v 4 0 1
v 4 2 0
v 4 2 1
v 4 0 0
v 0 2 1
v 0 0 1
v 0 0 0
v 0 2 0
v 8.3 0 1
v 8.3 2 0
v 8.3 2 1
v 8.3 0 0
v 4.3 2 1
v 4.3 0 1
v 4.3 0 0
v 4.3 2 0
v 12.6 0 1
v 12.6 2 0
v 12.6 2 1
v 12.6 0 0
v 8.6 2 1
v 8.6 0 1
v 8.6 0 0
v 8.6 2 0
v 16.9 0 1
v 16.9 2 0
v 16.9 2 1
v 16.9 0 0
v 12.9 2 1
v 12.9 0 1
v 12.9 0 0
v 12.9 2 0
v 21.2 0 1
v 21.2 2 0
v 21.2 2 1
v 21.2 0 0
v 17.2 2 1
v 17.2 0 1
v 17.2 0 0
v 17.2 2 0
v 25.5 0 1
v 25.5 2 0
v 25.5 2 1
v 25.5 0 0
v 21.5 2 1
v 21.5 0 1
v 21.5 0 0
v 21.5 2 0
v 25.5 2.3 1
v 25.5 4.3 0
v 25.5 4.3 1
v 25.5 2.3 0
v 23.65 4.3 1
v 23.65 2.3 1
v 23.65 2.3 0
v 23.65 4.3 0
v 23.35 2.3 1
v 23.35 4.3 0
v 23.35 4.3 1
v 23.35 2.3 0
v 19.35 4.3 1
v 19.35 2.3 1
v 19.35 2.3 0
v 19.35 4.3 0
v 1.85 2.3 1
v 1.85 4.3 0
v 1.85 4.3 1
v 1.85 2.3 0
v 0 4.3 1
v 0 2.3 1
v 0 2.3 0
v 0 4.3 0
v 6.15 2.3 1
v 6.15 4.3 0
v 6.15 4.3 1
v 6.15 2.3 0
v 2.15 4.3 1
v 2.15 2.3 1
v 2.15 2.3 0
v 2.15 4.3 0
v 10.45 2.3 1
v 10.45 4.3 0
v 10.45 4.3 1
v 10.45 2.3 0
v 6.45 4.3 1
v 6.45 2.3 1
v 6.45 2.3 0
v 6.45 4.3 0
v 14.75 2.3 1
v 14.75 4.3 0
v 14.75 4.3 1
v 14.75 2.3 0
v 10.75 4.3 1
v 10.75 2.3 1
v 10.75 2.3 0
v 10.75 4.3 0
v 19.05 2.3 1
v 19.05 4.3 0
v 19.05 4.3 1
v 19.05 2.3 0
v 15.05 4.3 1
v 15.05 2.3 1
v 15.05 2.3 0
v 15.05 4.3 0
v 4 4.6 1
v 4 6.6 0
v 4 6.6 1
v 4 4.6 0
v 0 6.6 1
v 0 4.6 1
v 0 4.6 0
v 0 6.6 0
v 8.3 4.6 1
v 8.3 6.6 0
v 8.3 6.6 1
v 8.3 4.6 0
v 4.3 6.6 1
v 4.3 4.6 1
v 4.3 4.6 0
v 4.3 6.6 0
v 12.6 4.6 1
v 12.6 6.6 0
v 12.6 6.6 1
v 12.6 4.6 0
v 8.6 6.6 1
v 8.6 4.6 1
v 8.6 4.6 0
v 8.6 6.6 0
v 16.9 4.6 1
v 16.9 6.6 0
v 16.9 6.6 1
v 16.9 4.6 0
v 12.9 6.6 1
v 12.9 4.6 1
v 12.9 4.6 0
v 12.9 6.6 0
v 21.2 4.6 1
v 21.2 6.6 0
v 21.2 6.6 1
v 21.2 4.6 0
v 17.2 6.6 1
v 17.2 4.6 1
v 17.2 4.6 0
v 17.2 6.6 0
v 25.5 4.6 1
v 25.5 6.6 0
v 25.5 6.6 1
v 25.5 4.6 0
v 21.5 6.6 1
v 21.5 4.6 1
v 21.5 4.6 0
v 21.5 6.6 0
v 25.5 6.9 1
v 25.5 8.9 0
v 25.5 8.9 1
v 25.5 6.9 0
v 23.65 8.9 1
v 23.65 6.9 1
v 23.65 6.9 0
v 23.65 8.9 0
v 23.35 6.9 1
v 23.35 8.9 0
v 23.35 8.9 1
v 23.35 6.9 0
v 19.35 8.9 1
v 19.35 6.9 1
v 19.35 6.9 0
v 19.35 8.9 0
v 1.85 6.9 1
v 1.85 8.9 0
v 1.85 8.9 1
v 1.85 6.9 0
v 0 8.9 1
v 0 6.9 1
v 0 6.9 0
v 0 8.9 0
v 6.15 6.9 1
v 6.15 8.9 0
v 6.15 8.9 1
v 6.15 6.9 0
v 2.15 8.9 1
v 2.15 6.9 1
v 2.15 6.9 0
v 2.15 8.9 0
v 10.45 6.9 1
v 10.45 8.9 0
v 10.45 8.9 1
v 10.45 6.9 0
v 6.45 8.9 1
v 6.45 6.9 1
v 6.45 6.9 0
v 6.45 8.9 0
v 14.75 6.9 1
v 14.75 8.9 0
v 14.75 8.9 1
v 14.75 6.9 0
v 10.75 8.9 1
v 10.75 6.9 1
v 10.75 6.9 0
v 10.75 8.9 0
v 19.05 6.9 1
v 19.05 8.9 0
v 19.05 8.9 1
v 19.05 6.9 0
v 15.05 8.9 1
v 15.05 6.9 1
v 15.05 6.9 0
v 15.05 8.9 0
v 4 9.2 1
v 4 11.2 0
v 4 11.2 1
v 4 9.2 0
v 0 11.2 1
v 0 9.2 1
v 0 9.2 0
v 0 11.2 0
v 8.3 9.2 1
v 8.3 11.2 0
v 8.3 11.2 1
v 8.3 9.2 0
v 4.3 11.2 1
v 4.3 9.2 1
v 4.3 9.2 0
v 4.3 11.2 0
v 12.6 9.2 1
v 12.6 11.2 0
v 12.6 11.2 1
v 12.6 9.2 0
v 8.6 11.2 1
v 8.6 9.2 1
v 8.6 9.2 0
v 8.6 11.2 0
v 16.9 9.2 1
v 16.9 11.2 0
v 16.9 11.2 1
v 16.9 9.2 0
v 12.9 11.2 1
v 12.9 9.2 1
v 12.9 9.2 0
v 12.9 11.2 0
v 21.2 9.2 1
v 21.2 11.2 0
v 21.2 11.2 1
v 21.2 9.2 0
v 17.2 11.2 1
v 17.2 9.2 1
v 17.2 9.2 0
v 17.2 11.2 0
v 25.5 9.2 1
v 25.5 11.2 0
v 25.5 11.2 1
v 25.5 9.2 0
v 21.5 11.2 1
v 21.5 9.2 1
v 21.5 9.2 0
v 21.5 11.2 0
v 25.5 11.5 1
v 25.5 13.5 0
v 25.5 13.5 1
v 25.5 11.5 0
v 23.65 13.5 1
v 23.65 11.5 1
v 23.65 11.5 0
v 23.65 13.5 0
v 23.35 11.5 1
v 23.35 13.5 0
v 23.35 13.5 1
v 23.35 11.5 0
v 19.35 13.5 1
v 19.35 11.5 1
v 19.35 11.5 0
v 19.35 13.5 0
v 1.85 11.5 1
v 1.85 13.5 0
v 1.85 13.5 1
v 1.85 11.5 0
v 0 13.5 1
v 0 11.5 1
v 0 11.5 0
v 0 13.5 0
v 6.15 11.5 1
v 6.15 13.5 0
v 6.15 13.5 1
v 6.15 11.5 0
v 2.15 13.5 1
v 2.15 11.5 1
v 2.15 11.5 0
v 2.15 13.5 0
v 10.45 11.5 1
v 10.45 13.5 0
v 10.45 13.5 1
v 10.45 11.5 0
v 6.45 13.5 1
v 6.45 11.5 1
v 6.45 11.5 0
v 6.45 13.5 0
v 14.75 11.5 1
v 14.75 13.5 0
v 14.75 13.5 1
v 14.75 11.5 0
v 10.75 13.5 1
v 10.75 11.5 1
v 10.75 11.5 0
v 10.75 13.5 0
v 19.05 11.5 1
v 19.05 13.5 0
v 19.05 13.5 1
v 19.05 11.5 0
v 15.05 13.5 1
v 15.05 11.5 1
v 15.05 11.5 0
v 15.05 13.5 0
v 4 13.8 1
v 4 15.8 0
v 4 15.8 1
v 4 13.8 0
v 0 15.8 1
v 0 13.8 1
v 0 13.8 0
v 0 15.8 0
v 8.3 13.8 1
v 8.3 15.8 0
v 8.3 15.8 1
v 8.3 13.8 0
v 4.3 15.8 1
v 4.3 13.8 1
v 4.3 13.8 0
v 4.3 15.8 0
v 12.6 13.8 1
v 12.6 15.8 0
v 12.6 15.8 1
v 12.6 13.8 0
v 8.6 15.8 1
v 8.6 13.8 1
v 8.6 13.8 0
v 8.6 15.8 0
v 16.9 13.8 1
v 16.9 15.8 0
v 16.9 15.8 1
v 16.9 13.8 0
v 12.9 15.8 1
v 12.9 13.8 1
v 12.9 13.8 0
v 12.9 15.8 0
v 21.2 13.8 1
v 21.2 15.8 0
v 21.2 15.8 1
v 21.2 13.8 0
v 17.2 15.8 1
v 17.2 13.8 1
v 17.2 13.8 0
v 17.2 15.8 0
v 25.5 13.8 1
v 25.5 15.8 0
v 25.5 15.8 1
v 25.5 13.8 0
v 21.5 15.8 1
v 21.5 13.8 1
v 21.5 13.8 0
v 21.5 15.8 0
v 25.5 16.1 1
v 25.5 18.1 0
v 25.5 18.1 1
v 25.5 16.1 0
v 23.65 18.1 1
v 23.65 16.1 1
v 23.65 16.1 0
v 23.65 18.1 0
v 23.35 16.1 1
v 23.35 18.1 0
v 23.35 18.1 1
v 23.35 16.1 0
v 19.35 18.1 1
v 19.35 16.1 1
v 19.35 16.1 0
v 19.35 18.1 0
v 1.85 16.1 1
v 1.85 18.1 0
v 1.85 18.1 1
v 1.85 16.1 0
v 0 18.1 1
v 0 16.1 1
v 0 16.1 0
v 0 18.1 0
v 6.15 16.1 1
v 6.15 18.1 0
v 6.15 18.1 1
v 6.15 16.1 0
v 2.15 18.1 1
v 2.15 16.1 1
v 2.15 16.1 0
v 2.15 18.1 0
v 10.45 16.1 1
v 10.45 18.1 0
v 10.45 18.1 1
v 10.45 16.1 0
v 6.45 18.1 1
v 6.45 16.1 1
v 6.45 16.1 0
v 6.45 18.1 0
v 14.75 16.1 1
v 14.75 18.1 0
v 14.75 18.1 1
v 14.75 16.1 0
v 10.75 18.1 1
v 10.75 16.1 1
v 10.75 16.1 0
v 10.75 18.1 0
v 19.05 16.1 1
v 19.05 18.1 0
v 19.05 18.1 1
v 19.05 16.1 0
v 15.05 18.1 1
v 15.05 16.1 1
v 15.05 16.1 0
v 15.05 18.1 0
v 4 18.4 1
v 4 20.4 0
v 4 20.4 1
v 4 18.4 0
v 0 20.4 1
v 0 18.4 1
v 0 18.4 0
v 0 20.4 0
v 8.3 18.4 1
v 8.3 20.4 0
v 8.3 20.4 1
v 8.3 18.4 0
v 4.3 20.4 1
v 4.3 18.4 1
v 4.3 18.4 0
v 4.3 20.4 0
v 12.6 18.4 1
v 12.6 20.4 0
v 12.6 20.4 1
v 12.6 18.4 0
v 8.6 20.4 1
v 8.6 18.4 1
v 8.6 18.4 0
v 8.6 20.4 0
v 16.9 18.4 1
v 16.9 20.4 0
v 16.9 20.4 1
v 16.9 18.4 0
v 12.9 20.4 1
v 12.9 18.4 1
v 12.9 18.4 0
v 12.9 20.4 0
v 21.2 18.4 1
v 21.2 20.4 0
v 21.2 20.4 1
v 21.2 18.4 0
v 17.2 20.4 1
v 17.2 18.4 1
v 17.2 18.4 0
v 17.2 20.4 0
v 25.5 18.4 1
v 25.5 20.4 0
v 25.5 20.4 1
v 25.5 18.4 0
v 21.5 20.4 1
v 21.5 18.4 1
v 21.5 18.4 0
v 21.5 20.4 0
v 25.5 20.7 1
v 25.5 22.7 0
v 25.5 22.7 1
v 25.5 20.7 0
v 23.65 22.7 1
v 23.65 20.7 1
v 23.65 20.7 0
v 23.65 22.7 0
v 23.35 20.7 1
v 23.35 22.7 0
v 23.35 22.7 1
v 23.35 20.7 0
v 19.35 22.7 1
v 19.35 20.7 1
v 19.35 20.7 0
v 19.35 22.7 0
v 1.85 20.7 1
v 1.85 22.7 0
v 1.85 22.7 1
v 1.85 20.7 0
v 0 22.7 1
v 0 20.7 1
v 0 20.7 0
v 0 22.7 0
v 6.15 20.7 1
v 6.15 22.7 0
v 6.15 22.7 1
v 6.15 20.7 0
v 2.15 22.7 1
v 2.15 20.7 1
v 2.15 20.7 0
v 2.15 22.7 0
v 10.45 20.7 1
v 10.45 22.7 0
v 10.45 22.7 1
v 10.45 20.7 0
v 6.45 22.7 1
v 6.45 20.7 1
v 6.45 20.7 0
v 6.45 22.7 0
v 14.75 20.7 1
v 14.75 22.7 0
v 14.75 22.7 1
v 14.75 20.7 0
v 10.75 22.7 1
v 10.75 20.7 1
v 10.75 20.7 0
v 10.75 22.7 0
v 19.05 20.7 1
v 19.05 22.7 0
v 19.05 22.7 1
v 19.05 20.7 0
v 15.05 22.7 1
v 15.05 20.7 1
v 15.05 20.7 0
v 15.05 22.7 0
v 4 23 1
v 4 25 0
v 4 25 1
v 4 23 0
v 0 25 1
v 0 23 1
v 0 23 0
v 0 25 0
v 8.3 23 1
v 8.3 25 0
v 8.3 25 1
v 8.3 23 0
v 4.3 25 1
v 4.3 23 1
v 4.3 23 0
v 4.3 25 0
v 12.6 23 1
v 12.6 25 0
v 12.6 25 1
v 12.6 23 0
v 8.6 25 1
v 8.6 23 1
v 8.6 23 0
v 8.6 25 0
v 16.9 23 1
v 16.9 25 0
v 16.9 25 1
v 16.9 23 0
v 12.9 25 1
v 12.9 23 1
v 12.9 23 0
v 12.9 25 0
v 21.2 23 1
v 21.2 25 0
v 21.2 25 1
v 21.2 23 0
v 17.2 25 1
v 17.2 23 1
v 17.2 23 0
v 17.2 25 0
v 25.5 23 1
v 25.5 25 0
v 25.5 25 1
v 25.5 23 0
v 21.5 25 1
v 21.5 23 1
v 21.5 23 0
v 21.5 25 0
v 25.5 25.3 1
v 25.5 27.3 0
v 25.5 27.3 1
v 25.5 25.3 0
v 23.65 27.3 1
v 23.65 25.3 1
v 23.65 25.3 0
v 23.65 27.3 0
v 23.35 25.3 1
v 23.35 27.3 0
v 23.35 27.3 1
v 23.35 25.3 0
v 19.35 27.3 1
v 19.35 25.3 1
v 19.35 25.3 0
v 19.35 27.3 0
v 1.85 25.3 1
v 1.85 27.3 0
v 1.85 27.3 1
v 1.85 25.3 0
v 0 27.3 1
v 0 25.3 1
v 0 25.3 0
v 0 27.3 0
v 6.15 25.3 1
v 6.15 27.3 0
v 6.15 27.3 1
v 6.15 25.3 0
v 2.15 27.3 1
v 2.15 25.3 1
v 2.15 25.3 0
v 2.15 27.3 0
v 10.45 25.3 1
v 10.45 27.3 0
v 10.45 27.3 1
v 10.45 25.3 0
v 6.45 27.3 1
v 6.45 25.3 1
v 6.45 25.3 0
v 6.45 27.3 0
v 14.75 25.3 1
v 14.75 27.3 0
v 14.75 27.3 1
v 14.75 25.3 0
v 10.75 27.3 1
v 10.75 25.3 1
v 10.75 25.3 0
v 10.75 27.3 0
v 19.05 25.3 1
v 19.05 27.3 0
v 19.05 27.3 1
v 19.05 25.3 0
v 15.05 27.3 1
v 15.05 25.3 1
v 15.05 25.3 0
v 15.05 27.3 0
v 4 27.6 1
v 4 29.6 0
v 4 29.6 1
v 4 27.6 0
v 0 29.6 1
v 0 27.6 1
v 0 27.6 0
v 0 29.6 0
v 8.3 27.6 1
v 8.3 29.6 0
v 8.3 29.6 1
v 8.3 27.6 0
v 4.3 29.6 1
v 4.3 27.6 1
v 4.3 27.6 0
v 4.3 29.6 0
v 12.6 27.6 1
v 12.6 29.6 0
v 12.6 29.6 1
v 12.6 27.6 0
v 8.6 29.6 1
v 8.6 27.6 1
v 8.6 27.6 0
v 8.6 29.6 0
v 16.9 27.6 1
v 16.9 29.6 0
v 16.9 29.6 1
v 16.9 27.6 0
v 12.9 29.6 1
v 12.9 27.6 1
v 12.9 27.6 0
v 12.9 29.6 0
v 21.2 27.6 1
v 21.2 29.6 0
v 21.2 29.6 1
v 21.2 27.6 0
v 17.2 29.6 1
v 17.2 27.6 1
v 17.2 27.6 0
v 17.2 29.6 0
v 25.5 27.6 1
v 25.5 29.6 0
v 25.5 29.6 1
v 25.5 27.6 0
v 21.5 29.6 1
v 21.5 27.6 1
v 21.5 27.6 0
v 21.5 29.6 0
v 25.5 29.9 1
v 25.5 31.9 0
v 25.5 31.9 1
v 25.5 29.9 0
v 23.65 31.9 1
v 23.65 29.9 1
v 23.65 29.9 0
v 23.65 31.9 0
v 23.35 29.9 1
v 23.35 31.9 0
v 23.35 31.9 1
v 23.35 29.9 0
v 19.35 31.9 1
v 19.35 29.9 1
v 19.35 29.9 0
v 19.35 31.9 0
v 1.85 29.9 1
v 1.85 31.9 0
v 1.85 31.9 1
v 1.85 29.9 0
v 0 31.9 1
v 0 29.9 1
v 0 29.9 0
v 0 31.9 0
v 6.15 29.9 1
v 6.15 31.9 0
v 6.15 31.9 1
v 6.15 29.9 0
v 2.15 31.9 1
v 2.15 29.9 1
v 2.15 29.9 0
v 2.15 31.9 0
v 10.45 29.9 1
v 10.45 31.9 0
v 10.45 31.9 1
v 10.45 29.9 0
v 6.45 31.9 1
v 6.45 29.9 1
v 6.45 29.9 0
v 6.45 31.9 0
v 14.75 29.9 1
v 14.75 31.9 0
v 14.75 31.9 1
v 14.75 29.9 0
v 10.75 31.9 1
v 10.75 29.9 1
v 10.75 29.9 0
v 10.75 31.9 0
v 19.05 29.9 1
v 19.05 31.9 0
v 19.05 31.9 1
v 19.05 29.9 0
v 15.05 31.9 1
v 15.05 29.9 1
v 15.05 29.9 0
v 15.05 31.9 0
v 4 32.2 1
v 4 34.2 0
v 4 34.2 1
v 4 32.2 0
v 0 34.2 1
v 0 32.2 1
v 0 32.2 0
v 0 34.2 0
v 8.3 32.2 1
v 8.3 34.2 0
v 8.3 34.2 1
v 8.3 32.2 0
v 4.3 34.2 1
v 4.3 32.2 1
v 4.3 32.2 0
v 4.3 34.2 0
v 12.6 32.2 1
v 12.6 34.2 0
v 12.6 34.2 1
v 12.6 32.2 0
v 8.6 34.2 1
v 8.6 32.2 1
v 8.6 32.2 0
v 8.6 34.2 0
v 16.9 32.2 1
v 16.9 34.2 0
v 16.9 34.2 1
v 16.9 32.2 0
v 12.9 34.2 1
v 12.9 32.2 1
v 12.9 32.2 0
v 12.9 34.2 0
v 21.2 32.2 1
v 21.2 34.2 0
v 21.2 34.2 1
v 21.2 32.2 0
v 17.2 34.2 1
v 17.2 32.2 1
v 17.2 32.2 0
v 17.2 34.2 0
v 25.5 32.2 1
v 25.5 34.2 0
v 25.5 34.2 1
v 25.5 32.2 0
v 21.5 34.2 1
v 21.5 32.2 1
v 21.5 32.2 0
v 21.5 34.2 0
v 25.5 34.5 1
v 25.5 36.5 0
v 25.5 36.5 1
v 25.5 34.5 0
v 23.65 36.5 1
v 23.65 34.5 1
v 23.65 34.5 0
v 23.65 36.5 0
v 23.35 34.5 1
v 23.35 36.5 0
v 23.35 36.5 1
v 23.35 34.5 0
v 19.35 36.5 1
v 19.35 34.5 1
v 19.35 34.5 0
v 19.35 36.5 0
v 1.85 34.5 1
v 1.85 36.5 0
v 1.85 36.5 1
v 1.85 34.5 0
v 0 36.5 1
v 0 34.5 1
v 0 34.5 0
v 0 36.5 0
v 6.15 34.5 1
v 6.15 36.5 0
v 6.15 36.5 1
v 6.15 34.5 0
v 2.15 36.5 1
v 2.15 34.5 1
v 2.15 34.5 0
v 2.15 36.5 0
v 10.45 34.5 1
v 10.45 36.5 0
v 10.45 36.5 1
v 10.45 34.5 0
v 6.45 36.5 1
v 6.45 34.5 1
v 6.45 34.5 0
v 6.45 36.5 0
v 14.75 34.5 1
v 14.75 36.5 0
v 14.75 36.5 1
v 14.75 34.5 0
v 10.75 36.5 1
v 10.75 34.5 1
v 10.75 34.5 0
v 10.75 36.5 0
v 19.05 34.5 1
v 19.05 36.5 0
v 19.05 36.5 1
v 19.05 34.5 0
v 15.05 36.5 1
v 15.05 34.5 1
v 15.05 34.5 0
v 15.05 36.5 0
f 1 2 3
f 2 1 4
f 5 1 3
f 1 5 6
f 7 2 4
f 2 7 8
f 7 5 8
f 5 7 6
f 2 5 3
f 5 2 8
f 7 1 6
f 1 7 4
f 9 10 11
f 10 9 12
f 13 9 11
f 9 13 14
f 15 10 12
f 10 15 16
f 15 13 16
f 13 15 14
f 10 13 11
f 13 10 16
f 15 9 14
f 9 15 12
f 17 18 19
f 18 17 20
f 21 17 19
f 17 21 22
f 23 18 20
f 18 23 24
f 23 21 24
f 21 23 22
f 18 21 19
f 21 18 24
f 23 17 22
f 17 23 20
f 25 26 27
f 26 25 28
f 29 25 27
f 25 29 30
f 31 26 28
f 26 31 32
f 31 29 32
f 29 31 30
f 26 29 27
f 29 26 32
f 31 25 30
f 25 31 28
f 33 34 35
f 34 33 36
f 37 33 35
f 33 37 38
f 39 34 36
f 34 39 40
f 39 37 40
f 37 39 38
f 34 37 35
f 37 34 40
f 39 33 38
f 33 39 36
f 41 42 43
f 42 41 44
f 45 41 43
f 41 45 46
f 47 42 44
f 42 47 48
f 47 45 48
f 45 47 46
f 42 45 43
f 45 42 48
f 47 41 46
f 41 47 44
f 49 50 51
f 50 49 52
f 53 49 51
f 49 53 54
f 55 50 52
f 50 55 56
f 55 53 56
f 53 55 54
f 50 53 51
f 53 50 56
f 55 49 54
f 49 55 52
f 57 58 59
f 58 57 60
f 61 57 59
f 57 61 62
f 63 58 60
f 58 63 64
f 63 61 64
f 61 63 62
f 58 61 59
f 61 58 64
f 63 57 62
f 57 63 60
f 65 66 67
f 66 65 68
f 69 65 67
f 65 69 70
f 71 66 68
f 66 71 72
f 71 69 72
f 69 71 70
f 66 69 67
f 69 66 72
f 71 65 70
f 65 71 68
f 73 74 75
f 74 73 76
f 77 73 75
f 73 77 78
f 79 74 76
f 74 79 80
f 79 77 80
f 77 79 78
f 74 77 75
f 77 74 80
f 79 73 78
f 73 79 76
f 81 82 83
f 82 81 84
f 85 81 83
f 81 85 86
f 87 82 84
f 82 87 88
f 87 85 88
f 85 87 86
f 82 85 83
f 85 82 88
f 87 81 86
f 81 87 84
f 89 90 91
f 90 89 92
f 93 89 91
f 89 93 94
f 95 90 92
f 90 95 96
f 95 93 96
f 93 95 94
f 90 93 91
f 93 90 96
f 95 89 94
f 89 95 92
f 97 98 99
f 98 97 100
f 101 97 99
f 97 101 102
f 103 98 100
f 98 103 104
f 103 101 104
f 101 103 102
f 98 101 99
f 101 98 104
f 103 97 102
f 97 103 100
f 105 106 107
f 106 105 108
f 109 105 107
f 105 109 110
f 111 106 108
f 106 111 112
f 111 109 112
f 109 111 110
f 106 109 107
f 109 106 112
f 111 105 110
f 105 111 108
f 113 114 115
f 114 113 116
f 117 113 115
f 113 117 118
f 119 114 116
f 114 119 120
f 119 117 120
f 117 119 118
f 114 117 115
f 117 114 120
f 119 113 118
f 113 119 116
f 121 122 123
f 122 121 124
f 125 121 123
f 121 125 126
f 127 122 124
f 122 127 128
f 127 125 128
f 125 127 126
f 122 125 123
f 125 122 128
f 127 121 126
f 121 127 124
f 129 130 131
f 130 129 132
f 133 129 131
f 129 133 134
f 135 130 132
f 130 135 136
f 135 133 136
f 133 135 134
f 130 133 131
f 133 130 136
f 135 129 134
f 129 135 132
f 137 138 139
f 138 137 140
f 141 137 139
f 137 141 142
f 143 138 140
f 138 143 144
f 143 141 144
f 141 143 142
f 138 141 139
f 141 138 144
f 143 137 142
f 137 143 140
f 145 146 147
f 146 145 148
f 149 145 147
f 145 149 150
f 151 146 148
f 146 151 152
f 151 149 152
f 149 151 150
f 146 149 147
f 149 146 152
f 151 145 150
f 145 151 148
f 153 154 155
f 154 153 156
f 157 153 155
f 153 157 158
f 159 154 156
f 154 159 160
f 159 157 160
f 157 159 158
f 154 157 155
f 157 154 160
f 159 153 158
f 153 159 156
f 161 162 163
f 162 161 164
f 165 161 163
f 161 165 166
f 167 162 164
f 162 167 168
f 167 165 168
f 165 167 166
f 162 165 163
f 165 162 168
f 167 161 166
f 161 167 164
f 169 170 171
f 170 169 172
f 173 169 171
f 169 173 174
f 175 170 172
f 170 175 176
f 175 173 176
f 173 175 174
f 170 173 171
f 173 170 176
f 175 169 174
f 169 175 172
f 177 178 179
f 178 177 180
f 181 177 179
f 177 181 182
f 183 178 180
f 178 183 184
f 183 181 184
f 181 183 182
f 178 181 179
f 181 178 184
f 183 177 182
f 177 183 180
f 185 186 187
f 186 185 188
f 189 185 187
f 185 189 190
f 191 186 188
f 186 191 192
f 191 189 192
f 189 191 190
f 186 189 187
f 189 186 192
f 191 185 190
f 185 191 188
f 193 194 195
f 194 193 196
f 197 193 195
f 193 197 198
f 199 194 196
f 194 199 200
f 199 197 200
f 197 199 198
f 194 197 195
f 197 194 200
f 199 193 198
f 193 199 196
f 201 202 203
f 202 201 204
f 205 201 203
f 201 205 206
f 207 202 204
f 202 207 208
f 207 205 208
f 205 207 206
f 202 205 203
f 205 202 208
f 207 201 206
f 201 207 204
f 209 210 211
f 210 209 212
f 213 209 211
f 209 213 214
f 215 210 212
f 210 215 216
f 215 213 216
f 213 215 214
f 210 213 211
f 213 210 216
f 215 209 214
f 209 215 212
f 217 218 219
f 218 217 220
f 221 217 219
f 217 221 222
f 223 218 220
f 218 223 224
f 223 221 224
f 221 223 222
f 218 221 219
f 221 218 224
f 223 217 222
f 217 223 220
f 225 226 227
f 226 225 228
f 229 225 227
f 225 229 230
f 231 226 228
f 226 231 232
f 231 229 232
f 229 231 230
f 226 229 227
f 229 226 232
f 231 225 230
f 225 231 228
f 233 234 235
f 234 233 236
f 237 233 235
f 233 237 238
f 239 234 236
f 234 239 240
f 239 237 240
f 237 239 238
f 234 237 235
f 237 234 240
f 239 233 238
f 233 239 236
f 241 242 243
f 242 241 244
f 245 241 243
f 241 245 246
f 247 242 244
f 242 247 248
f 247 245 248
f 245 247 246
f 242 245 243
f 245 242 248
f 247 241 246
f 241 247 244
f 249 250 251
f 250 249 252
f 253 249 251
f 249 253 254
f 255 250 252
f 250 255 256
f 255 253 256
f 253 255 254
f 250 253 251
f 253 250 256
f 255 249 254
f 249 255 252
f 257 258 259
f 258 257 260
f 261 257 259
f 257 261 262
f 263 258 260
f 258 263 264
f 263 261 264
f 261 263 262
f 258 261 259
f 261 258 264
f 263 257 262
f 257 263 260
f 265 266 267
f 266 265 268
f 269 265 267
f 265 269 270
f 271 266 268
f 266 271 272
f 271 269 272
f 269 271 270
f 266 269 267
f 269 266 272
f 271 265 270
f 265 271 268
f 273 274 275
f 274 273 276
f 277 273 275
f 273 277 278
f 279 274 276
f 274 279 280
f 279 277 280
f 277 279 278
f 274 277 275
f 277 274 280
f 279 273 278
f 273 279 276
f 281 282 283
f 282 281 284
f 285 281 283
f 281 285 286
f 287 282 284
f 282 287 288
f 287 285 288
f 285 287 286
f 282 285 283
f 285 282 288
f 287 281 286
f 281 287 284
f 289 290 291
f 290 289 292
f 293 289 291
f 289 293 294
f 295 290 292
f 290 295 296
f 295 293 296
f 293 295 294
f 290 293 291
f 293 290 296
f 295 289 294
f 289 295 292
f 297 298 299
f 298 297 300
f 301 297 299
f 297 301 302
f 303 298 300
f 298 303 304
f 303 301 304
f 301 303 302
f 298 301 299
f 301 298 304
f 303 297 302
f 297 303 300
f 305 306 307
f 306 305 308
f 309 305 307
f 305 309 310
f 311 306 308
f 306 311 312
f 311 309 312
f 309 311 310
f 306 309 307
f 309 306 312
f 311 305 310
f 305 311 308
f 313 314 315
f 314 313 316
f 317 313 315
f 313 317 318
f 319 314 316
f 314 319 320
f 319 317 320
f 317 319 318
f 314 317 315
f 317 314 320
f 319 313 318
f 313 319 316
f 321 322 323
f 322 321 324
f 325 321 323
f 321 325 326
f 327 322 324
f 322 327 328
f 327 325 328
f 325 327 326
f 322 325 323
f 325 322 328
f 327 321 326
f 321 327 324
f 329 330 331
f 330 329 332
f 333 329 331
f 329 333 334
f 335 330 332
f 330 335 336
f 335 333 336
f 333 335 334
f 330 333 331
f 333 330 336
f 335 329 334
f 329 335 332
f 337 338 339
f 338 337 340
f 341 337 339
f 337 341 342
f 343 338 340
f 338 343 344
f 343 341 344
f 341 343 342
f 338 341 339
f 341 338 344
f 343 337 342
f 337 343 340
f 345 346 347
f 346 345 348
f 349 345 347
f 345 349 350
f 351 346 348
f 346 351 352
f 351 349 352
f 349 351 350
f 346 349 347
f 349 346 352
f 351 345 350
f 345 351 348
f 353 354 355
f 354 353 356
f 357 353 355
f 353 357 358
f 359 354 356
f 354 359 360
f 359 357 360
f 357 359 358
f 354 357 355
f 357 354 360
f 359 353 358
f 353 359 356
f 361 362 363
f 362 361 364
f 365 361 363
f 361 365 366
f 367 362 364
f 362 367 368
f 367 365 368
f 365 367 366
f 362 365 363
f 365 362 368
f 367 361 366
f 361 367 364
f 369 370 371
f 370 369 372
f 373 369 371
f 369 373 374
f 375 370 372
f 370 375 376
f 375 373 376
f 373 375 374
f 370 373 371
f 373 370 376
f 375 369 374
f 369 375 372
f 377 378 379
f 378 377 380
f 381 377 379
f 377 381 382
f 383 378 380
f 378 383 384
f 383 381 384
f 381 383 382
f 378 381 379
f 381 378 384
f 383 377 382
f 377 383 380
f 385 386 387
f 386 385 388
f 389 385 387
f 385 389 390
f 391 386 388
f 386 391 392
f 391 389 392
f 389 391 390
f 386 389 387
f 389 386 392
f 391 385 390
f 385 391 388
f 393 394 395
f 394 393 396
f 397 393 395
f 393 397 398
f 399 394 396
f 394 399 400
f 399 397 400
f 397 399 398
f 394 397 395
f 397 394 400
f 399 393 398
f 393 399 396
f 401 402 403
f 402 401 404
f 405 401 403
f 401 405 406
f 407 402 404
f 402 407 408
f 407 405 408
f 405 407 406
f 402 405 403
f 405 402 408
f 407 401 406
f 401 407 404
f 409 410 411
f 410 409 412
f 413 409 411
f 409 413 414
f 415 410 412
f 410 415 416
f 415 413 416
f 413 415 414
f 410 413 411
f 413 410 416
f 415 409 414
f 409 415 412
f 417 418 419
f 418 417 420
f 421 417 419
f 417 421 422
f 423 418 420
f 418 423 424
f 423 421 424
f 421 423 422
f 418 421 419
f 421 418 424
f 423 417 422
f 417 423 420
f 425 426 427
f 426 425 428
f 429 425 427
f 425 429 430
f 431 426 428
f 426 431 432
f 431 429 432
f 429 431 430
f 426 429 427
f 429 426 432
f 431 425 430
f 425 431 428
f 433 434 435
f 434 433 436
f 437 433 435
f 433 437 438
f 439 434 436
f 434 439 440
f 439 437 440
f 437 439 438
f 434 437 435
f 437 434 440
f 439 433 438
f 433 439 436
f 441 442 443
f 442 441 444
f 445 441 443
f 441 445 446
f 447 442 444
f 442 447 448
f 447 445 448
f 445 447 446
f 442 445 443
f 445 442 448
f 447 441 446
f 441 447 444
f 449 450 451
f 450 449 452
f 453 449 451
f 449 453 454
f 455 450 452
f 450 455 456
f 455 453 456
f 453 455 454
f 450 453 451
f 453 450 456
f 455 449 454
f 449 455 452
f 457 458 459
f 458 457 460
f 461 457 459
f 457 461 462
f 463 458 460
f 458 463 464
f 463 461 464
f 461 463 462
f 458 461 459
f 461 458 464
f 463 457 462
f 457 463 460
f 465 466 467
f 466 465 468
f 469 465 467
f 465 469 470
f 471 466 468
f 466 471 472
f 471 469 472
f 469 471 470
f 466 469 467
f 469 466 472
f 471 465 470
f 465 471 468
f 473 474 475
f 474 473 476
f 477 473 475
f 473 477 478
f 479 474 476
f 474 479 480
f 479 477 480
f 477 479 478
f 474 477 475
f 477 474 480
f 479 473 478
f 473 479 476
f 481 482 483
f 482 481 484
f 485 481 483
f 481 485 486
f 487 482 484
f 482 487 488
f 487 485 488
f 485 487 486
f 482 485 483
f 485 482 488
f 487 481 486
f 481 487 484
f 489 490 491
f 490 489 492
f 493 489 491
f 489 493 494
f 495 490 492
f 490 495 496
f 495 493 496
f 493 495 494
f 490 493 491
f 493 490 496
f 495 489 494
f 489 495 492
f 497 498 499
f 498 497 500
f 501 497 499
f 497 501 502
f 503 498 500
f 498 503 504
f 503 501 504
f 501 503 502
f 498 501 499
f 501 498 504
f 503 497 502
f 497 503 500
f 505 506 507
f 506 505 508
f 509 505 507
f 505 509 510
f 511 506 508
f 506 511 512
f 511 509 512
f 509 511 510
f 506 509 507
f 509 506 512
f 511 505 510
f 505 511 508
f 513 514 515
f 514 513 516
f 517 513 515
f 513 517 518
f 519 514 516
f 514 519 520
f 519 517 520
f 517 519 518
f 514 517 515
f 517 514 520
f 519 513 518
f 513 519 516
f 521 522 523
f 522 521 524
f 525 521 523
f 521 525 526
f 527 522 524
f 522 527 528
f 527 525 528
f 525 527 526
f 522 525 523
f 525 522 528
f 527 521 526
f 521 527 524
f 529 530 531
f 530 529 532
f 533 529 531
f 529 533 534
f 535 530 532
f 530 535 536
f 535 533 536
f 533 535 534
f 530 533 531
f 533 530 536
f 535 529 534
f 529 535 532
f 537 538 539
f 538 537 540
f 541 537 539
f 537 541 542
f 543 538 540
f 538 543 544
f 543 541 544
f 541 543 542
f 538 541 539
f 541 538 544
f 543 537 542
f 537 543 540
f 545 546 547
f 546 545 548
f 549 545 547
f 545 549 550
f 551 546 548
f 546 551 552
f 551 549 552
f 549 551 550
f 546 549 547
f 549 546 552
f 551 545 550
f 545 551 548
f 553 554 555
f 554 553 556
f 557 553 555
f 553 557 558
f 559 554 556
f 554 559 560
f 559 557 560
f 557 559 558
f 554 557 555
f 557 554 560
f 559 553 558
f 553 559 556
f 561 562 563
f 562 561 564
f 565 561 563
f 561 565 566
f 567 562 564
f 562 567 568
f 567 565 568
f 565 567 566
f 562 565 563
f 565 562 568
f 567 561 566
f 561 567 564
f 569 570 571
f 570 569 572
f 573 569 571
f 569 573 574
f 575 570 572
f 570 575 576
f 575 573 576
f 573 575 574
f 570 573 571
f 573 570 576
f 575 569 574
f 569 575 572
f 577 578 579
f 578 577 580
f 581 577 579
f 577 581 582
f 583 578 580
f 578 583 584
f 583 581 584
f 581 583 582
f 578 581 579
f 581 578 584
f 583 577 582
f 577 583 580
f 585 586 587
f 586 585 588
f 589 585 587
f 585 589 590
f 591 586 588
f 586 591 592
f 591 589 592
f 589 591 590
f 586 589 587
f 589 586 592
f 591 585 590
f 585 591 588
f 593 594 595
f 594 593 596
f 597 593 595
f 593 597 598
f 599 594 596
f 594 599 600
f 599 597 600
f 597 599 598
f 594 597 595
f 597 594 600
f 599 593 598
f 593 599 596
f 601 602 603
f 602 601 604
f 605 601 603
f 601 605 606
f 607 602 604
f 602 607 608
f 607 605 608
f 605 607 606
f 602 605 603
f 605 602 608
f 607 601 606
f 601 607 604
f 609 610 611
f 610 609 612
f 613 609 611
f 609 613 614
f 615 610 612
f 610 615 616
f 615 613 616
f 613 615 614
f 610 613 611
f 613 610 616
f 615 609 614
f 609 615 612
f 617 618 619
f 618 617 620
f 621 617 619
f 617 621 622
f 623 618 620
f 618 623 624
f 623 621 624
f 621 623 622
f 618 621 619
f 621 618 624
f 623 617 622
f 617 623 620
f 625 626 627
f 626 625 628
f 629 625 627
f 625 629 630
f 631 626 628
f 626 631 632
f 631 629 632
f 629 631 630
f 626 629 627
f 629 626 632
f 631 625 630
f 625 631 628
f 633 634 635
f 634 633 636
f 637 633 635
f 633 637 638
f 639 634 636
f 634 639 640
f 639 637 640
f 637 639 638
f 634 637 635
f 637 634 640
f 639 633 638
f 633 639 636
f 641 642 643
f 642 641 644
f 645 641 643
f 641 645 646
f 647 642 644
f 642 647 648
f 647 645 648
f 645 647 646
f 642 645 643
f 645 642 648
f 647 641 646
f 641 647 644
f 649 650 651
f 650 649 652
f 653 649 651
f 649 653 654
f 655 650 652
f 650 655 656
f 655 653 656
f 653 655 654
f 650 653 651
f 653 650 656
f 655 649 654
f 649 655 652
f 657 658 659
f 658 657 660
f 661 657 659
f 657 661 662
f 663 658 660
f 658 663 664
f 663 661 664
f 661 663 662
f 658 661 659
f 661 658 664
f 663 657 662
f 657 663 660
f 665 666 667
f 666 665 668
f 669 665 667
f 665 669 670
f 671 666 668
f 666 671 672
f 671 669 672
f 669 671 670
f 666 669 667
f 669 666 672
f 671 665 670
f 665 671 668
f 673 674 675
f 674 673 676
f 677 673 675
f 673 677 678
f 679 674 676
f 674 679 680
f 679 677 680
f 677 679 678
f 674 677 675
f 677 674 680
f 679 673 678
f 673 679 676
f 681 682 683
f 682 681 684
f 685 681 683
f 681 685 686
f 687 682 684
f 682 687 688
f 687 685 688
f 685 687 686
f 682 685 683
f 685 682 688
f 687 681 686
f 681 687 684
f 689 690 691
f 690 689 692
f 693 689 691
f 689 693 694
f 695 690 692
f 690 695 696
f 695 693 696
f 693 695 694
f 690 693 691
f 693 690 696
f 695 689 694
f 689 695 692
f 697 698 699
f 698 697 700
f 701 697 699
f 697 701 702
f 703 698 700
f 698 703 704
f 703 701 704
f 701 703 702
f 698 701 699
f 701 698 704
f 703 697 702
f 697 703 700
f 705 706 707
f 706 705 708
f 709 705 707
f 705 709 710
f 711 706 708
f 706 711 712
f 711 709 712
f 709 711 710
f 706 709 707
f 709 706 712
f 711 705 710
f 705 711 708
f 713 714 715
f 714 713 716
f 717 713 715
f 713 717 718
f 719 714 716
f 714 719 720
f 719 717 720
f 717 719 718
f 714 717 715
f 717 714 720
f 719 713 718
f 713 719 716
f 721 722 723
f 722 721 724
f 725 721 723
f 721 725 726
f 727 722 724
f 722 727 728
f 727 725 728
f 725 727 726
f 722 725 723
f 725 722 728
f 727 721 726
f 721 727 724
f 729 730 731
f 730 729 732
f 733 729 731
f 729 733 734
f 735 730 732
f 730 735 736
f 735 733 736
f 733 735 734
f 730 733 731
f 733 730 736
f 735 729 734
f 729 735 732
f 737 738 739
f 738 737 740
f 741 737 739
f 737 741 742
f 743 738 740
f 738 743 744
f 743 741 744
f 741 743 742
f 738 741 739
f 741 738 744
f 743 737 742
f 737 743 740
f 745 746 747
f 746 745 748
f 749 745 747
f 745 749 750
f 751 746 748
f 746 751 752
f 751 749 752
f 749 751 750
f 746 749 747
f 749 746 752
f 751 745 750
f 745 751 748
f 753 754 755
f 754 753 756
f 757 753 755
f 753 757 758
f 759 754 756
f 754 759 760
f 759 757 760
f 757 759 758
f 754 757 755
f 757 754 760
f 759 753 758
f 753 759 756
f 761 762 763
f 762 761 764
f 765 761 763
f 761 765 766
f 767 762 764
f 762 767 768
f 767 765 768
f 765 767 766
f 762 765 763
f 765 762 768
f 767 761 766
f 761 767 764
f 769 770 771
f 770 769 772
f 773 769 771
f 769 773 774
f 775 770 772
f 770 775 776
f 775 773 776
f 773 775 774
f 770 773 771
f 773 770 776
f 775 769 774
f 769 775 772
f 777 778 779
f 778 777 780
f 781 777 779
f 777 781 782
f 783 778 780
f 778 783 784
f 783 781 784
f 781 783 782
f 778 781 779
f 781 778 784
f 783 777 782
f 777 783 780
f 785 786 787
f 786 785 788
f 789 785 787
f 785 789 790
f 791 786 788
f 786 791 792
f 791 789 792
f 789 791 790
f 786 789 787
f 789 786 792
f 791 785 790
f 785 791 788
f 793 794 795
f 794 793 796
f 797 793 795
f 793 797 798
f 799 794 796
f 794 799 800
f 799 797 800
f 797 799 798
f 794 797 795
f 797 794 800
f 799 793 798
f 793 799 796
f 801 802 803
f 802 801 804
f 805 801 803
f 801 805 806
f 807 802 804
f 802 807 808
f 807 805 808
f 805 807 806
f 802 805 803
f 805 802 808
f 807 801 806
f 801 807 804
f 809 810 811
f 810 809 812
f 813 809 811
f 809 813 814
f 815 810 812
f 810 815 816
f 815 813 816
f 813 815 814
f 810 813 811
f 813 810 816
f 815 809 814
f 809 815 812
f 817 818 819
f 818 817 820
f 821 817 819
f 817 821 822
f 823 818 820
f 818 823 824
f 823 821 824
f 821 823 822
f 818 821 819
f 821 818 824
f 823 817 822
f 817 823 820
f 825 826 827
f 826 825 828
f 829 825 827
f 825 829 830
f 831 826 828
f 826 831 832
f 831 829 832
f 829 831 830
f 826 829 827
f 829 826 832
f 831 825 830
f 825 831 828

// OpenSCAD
/* brickpattern - makes brick wall patterns

Usage:
	use <path/to/brickpattern.scad>
	...
	brickpattern(
		layers=6, //how many rows of bricks
		run=10, //how many bricks in each row
		brickwidth=4, //individual brick width
		brickheight=2, //individual brick height
		brickthickness=1, //individual brick thickness
		mortar=0.3  // width of mortar lines between bricks
	);
	
The numbers given above are the defaults if you just do
brickpattern();  define them to suit your scale and intended 
brick style.
	
This routine just draws the bricks; you need to add a
cube of "mortar" in the dimensions of your wall into which
to embed the pattern.

To use in other programs, create your brick pattern in the 
required dimensions and export as a .STL file.  Note that
this will lose the color definition.

*/

module brickpattern(layers=6, run=10, brickwidth=4, brickheight=2, brickthickness=1, mortar=.3) {
	for (layer = [0:1:layers-1]) {
		for (brick = [0:1:run-1]) {
			if (layer % 2) {  //layer with half-bricks on each end
				if (brick == 0) {  //first brick, half-brick
					translate([	0, 
								layer*(brickheight+mortar), 
								0]) 
						color("Red") cube([(brickwidth-mortar)/2, brickheight, brickthickness]);
				}
				else if (brick == run-1) { //last two bricks, a full one and ending with a half one...
					translate([	(brickwidth/2+mortar/2) + (brick)*(brickwidth+mortar), 
								layer*(brickheight+mortar), 
								0]) 
						color("Red") cube([(brickwidth-mortar)/2, brickheight, brickthickness]);
					translate([	(brickwidth/2+mortar/2) + (brick-1)*(brickwidth+mortar), 
								layer*(brickheight+mortar), 
								0])
						color("Red") cube([brickwidth, brickheight, brickthickness]);
				}
				else {  //second and subsequent full bricks
					translate([	(brickwidth/2+mortar/2) + (brick-1)*(brickwidth+mortar), 
								layer*(brickheight+mortar), 
								0]) 
						color("Red") cube([brickwidth, brickheight, brickthickness]);
				}
			}
			else { // layer that doesn't contain half-bricks
				translate(	[brick*(brickwidth+mortar),
							layer*(brickheight+mortar), 
							0]) 
					color("Red") cube([brickwidth, brickheight, brickthickness]);

			}
		}
	}
}

brickpattern(16,6);
